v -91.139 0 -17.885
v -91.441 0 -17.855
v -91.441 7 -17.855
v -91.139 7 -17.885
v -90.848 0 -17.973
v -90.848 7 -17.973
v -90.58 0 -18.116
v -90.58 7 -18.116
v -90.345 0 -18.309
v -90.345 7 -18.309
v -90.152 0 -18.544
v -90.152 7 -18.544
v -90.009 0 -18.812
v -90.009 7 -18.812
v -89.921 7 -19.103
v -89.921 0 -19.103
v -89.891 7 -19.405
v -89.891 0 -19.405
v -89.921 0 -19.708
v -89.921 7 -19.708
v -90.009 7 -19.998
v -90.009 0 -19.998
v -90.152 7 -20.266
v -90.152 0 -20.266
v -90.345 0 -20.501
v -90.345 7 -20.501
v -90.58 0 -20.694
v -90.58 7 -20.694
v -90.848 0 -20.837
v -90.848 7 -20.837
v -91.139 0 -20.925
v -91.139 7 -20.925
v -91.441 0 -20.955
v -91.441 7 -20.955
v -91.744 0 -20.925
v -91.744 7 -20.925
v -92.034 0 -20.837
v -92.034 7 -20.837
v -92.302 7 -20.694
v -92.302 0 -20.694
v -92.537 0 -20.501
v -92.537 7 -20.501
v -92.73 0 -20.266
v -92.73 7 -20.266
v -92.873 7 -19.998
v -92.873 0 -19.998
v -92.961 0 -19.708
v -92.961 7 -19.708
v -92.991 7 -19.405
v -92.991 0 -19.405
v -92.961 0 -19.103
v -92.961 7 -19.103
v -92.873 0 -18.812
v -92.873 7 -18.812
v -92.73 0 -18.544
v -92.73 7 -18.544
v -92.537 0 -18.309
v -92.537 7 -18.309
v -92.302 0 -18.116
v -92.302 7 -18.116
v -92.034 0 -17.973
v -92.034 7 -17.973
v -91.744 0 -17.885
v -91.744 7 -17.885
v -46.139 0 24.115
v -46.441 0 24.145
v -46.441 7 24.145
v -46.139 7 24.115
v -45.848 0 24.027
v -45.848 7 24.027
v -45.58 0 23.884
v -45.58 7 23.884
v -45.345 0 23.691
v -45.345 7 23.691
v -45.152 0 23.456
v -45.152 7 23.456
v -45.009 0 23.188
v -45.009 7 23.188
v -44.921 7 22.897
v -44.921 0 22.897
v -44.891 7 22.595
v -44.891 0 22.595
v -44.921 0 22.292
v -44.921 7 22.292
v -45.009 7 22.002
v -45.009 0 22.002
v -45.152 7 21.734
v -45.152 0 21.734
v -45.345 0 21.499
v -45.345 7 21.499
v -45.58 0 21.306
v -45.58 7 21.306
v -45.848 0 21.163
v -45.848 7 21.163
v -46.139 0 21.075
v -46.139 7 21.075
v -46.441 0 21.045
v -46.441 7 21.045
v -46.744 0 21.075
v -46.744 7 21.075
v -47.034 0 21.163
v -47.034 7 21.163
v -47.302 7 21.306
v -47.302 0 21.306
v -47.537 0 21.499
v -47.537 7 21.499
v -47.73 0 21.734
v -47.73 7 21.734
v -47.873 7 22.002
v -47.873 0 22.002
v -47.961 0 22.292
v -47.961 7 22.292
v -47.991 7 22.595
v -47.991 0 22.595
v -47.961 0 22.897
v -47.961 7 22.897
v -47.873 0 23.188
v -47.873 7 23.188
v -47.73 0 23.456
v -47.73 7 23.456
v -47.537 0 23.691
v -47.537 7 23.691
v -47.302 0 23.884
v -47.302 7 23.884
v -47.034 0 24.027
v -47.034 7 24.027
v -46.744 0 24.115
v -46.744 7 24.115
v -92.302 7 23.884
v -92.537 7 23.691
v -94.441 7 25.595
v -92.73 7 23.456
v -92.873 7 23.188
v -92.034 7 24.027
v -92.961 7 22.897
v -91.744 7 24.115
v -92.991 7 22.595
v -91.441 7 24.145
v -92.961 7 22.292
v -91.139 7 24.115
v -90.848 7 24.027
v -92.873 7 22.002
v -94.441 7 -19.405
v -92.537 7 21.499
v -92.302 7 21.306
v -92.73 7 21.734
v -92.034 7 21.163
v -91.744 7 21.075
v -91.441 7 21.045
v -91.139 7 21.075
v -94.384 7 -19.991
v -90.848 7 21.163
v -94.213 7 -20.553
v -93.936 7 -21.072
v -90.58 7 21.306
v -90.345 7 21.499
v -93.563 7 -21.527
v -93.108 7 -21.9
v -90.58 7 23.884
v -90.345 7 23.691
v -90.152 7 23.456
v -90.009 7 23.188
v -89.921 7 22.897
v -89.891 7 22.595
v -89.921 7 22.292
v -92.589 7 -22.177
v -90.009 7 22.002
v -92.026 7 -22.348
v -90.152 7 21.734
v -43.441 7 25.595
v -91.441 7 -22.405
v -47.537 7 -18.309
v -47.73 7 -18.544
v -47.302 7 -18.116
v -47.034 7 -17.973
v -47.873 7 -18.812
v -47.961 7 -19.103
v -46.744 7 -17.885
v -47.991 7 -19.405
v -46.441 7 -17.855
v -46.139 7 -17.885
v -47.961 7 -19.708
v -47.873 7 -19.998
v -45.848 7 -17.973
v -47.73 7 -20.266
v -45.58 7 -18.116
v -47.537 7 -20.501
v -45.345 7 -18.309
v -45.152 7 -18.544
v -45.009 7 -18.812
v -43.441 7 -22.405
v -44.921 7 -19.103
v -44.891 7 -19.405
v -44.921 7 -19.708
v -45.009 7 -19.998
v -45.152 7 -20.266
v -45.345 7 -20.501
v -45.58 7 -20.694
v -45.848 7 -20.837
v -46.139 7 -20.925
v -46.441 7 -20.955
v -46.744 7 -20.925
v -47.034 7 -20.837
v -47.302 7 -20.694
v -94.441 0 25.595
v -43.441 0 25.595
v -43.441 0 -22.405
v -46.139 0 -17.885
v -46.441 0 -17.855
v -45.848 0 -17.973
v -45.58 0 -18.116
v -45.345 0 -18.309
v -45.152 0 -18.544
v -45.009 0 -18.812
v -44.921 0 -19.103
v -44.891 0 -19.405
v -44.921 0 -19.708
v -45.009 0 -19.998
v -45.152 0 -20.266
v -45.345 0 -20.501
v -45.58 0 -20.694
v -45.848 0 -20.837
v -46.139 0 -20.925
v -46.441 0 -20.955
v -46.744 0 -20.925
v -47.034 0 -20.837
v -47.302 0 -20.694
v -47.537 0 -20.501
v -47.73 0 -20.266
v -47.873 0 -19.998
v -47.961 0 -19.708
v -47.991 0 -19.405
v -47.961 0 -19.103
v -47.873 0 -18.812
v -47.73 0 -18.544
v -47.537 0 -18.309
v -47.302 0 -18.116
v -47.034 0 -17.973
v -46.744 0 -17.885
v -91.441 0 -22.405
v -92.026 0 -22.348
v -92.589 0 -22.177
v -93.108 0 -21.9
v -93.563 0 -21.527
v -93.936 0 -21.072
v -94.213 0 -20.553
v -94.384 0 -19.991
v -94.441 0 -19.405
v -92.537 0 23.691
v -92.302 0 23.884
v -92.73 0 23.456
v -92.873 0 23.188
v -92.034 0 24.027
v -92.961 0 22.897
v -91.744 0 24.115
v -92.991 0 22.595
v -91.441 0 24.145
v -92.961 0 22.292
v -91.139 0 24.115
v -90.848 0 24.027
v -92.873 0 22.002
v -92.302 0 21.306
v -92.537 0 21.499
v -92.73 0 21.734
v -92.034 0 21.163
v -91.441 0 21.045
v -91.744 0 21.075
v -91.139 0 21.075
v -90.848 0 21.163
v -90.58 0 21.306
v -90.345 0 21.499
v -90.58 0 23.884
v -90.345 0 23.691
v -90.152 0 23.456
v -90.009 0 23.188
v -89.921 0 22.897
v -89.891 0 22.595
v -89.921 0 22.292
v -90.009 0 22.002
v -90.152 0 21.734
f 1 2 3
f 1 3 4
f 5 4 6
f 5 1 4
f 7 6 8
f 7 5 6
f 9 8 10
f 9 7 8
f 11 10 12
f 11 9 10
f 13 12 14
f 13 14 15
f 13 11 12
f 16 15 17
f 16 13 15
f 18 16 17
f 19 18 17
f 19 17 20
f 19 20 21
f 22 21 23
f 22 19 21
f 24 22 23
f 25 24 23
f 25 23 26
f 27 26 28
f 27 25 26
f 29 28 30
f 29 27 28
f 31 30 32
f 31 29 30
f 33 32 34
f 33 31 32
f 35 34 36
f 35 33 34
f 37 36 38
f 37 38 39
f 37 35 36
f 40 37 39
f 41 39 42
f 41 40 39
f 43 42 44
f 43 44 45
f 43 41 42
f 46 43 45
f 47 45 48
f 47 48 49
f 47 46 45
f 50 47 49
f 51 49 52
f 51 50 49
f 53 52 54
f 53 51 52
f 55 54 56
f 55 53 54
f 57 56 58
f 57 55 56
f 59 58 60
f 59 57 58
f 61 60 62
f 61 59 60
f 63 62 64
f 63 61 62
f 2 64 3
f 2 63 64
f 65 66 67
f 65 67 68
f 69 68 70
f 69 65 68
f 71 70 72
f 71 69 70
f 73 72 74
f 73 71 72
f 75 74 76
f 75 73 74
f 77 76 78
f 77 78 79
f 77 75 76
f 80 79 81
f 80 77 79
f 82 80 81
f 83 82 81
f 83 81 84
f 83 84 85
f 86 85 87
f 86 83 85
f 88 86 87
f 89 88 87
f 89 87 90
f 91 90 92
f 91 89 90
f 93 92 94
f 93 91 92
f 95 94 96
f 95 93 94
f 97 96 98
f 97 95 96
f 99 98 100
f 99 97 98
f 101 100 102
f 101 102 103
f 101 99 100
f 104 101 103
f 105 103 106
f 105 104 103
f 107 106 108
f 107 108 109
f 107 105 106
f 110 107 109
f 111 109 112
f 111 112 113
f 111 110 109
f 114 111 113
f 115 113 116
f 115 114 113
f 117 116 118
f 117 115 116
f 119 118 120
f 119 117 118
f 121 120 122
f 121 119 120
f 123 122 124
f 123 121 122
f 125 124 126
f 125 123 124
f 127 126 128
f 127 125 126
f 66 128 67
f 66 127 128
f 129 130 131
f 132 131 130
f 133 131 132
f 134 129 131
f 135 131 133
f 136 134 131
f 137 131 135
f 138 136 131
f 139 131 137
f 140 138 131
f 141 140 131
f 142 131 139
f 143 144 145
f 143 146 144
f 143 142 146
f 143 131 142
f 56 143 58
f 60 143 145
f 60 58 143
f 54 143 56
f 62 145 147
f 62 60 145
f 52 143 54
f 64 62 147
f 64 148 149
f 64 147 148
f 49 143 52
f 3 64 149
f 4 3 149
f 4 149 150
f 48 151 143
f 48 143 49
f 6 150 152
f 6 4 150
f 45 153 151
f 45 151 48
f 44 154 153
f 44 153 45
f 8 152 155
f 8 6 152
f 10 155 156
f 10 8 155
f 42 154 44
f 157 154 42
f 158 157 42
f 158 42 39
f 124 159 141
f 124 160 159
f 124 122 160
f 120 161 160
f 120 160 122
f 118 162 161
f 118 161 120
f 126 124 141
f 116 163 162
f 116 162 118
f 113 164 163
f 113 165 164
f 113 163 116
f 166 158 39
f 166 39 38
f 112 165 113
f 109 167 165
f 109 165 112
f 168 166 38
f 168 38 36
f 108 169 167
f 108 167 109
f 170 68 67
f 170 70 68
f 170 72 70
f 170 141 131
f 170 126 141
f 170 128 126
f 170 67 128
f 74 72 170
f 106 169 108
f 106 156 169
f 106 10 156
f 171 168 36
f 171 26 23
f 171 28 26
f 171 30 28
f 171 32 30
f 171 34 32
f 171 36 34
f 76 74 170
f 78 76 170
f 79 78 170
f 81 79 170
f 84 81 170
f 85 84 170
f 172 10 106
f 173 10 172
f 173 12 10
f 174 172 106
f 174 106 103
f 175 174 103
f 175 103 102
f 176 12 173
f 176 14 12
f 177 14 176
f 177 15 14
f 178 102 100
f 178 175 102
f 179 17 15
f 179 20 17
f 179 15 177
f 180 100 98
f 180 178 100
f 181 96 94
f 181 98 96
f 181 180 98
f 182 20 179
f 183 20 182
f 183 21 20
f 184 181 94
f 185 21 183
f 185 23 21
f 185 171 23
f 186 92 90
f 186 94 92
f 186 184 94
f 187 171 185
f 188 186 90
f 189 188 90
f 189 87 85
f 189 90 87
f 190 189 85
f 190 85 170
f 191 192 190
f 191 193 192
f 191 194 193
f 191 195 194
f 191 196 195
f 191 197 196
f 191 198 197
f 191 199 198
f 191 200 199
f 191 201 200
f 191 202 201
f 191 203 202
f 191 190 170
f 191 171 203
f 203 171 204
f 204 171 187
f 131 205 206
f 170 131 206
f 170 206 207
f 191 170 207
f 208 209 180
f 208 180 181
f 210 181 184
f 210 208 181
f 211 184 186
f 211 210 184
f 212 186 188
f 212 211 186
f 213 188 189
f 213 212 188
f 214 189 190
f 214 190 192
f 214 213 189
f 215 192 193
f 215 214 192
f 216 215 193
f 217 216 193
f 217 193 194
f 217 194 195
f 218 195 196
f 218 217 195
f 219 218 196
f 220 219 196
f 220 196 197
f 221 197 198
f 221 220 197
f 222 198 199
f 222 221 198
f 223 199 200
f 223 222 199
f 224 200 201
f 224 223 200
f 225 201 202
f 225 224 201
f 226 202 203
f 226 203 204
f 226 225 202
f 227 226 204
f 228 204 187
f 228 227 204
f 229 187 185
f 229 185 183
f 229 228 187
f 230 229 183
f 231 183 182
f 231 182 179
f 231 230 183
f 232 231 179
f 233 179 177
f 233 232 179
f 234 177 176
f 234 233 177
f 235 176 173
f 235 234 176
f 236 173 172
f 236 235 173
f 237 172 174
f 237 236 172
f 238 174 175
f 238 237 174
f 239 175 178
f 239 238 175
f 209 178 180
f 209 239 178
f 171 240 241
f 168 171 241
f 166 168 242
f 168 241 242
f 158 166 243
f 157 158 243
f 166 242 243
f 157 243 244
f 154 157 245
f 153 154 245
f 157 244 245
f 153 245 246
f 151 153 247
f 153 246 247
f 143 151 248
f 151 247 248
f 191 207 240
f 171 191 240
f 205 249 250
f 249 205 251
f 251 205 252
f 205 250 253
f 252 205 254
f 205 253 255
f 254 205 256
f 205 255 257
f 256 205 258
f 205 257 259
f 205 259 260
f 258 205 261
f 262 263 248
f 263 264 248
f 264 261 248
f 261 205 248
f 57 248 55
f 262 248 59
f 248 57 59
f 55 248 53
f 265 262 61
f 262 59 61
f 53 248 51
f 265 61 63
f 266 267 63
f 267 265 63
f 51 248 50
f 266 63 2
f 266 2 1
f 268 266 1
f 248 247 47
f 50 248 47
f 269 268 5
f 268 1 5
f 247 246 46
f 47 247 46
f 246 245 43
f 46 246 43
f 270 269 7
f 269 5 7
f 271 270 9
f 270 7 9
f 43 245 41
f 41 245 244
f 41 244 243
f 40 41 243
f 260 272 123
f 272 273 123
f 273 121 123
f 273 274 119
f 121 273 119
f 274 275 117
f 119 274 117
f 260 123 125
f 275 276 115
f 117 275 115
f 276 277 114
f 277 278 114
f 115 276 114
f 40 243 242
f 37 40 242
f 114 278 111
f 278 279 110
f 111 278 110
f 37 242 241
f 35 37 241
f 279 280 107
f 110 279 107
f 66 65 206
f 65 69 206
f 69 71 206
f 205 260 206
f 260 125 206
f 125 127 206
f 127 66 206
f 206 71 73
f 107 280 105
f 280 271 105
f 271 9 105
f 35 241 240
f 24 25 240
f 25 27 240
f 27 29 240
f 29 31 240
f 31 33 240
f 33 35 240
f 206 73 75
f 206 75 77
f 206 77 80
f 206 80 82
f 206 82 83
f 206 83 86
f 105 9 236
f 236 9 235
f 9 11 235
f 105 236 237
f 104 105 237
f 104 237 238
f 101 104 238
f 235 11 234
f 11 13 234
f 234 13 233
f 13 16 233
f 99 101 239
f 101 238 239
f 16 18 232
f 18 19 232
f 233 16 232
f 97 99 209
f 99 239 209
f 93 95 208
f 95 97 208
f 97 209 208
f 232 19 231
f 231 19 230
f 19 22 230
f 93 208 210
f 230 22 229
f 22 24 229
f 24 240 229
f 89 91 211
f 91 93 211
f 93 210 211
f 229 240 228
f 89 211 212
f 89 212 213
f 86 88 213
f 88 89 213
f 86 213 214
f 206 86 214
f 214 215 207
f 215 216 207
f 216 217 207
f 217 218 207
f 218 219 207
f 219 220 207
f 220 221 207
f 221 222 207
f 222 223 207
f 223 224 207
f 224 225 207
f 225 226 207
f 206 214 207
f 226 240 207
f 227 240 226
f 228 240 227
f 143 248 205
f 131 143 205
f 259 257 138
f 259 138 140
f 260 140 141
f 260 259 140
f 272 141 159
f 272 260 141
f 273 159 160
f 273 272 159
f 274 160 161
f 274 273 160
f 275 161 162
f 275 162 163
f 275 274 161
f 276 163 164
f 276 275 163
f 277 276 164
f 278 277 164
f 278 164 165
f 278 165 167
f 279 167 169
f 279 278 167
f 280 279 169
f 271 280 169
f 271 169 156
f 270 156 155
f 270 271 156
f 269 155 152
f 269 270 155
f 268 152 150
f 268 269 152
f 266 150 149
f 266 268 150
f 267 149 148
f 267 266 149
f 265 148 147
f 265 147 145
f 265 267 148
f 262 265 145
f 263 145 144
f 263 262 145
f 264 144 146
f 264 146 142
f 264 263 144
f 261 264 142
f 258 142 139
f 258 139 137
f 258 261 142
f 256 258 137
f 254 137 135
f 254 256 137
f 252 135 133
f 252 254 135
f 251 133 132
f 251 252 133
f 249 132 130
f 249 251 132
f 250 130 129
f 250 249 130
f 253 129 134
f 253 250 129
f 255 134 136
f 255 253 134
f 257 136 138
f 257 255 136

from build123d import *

# Parameters (mm, degrees)
SKETCH1_R           = 1.55
BOSS_EXTRUDE1_DEPTH = 7


with BuildPart() as part:
    # Sketch1 → Boss-Extrude1 (new body)
    with BuildSketch(Plane(origin=(0, 0, 0), x_dir=(1, 0, 0), z_dir=(0, 1, 0))):
        with BuildLine():
            Line((-94.441213517, -25.59472558), (-43.441213517, -25.59472558))
            Line((-43.441213517, -25.59472558), (-43.441213517, 22.40527442))
            Line((-43.441213517, 22.40527442), (-91.441213517, 22.40527442))
            ThreePointArc((-91.441213517, 22.40527442), (-93.562533861, 21.526594764), (-94.441213517, 19.40527442))
            Line((-94.441213517, 19.40527442), (-94.441213517, -25.59472558))
        make_face()
        with Locations(Location((-46.441213517, 19.40527442, 0), (0, 0, 270))):
            Circle(SKETCH1_R, mode=Mode.SUBTRACT)
        with Locations(Location((-46.441213517, -22.59472558, 0), (0, 0, 270))):
            Circle(SKETCH1_R, mode=Mode.SUBTRACT)
        with Locations(Location((-91.441213517, -22.59472558, 0), (0, 0, 270))):
            Circle(SKETCH1_R, mode=Mode.SUBTRACT)
        with Locations(Location((-91.441213517, 19.40527442, 0), (0, 0, 270))):
            Circle(SKETCH1_R, mode=Mode.SUBTRACT)
    extrude(amount=BOSS_EXTRUDE1_DEPTH)


solid = part.part
